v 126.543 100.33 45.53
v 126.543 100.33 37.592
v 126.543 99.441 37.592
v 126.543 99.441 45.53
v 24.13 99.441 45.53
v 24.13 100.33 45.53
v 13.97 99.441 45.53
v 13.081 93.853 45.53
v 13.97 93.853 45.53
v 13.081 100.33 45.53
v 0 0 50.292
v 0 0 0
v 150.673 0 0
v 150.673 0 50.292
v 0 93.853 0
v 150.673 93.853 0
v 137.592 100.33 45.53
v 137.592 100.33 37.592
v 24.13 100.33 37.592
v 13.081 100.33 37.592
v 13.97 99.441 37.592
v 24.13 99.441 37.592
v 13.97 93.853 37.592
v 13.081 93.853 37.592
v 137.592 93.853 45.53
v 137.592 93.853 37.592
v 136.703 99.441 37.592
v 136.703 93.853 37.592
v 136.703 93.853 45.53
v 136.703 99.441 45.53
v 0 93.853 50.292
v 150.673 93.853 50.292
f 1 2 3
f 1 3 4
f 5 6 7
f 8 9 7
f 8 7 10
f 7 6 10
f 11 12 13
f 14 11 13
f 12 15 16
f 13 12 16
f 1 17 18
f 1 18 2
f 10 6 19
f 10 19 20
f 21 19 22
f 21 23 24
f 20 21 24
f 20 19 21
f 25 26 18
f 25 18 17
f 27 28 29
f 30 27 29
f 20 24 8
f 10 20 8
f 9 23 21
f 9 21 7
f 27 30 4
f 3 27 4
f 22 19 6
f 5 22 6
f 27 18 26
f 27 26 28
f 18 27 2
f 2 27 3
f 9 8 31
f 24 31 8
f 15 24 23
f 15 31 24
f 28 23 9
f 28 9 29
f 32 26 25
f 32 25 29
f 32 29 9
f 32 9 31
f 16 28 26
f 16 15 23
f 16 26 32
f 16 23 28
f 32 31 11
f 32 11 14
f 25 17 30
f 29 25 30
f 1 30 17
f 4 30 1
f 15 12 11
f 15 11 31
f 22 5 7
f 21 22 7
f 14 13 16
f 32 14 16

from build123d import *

# Parameters (mm, degrees)
SKETCH2_W      = 150.6728
SKETCH2_H      = 93.853
EXTRUDE1_DEPTH = 50.292
SKETCH3_W      = 0.889
SKETCH3_H      = 7.9375
EXTRUDE2_DEPTH = 6.477
SKETCH5_W      = 11.049
SKETCH5_H      = 7.9375
EXTRUDE3_DEPTH = 0.889


with BuildPart() as part:
    # Sketch2 → Extrude1 (new body)
    with BuildSketch(Plane.XY):
        with Locations((75.3364, 46.9265)):
            Rectangle(SKETCH2_W, SKETCH2_H)
    extrude(amount=EXTRUDE1_DEPTH)

    # Sketch3 → Extrude2 (add)
    with BuildSketch(Plane(origin=(0, 93.853, 0), x_dir=(-1, 0, 0), z_dir=(0, 1, 0))):
        with Locations((-13.5255, 41.56075)):
            Rectangle(SKETCH3_W, SKETCH3_H)
        with Locations((-137.1473, 41.56075)):
            Rectangle(SKETCH3_W, SKETCH3_H)
    extrude(amount=EXTRUDE2_DEPTH)

    # Sketch5 → Extrude3 (add)
    with BuildSketch(Plane(origin=(0, 100.33, 0), x_dir=(-1, 0, 0), z_dir=(0, 1, 0))):
        with Locations((-18.6055, 41.56075)):
            Rectangle(SKETCH5_W, SKETCH5_H)
        with Locations((-132.0673, 41.56075)):
            Rectangle(SKETCH5_W, SKETCH5_H)
    extrude(amount=-EXTRUDE3_DEPTH)


solid = part.part
